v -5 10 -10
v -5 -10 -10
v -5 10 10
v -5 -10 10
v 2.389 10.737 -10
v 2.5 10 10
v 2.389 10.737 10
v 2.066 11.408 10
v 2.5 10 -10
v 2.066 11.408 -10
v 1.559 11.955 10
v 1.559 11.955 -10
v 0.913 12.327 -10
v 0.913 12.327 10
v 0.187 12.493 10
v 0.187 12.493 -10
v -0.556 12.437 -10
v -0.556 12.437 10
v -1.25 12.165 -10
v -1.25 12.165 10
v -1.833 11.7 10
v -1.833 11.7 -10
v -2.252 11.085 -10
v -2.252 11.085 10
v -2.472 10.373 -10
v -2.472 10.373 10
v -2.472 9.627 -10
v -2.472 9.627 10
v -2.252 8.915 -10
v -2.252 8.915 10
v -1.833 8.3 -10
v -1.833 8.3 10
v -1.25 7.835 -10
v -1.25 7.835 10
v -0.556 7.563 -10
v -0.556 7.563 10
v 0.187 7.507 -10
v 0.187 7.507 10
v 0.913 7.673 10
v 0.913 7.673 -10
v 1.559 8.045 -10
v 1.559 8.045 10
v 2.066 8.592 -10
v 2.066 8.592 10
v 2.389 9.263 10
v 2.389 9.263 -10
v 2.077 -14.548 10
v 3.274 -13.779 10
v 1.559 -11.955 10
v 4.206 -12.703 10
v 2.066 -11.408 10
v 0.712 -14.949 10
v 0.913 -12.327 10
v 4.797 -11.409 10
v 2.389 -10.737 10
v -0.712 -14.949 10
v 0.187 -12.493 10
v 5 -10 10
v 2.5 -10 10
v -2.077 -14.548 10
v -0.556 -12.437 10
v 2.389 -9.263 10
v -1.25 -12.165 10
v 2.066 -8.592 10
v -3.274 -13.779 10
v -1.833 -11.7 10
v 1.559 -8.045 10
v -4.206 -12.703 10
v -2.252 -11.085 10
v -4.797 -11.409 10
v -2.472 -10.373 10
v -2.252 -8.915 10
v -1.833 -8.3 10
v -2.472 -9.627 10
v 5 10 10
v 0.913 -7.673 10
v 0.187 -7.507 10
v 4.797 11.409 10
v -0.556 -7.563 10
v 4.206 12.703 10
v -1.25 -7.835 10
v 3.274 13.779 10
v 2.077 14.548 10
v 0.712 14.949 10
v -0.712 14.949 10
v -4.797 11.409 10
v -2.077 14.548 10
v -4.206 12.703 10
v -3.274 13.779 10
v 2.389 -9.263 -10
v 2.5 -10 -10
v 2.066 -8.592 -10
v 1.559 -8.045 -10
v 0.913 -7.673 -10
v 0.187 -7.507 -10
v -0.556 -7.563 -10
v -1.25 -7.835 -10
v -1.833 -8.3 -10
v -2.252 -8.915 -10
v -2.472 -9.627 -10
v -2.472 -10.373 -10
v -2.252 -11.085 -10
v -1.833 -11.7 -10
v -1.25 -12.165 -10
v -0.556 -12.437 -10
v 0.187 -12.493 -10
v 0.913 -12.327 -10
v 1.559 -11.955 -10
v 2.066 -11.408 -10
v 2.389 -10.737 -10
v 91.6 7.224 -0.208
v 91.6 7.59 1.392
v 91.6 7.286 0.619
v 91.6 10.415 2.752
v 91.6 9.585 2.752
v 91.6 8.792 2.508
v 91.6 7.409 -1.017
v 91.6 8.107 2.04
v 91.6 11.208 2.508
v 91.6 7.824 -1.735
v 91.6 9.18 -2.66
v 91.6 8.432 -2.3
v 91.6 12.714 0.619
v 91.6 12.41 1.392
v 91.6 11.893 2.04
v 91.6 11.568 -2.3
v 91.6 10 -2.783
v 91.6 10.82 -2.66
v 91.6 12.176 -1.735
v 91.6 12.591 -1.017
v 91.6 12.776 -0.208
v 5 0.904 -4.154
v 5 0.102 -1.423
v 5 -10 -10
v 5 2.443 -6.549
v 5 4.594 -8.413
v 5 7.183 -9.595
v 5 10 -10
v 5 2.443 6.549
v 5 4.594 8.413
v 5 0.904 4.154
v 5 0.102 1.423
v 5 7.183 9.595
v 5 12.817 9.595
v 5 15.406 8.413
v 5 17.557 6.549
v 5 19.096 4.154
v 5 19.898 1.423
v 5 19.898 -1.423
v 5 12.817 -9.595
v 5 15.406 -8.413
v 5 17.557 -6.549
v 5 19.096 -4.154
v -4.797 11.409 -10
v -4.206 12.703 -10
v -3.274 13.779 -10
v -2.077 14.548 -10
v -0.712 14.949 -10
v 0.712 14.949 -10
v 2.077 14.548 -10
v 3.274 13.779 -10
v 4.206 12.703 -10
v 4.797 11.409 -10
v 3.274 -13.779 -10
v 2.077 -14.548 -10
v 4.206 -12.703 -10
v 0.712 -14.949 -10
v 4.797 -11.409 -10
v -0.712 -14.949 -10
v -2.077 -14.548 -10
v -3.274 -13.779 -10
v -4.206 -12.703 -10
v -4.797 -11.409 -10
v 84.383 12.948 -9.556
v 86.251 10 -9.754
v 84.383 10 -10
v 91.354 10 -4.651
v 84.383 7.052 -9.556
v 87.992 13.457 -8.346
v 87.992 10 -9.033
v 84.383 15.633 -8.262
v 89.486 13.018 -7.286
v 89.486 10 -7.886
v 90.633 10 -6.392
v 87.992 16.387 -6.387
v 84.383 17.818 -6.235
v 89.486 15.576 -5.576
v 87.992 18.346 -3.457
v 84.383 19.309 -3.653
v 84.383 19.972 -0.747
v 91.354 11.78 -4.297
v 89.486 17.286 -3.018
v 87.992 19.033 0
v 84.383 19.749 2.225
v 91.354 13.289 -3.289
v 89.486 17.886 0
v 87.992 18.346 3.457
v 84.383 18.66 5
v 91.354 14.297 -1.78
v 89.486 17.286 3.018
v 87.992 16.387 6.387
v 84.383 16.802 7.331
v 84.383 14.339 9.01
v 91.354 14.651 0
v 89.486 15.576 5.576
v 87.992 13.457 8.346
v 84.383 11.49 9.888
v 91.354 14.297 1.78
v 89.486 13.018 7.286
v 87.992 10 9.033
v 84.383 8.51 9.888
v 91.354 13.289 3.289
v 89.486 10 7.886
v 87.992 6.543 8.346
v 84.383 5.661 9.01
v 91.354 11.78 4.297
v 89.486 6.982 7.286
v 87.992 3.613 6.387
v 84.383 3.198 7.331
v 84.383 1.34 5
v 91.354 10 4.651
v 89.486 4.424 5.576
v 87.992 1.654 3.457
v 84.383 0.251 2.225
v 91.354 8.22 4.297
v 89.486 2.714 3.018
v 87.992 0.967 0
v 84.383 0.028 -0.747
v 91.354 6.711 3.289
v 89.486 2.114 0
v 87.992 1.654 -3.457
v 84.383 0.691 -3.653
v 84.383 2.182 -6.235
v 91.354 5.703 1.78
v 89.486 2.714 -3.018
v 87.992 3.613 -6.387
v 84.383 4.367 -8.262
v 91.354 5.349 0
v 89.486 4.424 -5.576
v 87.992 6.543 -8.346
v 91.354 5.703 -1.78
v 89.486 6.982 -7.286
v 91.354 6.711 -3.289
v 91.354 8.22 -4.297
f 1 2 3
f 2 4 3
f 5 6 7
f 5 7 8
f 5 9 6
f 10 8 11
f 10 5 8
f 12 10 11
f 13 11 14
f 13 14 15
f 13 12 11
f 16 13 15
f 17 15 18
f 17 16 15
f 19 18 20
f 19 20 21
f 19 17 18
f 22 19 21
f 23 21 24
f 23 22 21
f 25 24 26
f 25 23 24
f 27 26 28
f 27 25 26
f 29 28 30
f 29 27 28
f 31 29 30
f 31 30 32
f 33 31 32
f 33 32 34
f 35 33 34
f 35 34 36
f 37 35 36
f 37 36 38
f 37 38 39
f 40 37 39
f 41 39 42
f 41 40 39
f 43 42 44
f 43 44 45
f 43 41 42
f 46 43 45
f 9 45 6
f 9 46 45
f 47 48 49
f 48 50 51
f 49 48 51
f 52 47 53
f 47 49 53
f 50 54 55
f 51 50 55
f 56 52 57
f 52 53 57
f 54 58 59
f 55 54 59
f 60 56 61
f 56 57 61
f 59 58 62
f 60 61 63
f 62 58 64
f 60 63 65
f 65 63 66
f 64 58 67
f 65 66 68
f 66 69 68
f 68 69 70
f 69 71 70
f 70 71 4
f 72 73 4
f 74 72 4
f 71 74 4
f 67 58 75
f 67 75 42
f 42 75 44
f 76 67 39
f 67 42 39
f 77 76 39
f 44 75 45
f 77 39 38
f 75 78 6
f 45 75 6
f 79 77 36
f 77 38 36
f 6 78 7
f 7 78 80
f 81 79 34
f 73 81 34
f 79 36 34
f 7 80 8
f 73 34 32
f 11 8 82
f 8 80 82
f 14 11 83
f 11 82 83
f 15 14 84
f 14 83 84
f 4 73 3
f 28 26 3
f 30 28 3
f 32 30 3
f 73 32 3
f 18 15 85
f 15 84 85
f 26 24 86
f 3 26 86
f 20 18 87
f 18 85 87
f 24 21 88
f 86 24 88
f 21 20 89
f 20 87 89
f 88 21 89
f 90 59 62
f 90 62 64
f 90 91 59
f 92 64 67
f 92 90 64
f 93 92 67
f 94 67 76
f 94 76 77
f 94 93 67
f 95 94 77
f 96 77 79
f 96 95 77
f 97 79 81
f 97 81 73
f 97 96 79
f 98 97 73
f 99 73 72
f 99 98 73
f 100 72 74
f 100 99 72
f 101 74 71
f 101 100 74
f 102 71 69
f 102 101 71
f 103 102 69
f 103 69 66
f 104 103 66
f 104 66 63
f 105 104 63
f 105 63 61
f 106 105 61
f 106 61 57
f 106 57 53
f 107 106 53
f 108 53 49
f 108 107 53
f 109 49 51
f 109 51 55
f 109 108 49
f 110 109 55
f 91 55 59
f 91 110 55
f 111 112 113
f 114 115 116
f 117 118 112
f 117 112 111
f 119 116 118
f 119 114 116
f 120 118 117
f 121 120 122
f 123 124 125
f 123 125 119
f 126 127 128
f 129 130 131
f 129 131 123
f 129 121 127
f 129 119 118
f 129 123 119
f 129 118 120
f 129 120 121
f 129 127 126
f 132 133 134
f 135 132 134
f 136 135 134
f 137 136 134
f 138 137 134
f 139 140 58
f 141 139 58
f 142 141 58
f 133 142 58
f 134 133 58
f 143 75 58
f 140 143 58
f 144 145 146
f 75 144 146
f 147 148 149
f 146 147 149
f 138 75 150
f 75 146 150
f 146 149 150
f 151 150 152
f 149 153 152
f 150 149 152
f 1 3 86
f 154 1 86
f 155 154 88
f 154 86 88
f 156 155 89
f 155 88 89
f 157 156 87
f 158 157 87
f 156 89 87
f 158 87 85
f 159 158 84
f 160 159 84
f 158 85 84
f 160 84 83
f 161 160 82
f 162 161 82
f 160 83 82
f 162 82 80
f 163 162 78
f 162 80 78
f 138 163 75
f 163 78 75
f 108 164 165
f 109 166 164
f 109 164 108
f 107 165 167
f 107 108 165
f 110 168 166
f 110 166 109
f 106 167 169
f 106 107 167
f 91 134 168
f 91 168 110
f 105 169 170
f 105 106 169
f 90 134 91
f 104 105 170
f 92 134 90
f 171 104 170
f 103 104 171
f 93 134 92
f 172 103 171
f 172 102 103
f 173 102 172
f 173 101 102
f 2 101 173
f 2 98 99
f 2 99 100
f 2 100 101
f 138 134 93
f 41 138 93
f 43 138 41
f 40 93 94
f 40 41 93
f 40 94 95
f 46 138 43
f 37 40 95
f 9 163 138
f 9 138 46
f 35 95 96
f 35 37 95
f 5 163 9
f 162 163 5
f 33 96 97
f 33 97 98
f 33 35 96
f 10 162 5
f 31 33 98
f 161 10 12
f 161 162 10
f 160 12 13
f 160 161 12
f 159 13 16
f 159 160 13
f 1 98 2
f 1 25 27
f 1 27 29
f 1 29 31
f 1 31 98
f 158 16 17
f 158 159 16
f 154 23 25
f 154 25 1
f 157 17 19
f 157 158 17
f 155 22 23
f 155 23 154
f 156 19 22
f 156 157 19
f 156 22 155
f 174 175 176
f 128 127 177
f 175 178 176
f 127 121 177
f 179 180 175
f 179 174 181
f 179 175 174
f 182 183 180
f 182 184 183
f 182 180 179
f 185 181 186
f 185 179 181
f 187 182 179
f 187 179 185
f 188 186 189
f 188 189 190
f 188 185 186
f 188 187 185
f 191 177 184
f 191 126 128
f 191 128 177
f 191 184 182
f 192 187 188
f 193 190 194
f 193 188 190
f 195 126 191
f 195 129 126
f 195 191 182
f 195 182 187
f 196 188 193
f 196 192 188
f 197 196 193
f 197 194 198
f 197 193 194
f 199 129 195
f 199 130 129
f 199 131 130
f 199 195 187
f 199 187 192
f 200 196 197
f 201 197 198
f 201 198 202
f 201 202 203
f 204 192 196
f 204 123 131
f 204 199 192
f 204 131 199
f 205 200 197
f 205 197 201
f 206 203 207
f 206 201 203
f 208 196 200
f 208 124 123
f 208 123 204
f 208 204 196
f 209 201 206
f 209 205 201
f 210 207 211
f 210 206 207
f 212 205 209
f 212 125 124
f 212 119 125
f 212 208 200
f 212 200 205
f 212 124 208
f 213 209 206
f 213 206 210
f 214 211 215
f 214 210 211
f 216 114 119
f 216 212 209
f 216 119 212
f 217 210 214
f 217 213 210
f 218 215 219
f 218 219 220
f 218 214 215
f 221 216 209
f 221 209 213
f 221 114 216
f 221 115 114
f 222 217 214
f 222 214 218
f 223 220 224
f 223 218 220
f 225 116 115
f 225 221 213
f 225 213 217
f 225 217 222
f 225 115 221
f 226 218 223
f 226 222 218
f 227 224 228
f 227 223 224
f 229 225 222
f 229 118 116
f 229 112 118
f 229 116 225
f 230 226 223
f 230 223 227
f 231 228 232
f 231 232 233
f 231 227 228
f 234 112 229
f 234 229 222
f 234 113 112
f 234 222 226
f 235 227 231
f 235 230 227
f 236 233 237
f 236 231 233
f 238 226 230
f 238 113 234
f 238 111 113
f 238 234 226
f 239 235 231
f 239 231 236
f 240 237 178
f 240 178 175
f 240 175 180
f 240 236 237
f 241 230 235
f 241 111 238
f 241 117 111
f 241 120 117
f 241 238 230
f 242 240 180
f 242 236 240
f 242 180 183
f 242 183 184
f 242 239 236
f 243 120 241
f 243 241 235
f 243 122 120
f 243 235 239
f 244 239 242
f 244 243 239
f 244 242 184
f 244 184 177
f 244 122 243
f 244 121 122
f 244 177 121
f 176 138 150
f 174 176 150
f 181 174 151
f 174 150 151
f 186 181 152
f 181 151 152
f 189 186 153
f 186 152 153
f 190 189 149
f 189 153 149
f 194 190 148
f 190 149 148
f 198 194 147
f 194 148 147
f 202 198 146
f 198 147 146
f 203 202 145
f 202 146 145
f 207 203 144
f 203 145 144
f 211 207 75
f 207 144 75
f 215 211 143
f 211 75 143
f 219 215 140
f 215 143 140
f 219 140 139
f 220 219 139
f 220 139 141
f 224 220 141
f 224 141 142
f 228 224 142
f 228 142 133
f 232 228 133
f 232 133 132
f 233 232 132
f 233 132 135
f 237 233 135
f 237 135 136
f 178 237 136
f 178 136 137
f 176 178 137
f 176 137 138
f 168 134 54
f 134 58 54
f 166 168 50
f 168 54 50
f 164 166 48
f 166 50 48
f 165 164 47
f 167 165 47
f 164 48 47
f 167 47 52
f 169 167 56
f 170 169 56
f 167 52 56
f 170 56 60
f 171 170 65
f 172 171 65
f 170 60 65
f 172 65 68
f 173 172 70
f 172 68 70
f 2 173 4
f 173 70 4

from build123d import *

# Parameters (mm, degrees)
ESQUISSE1_R        = 2.5
BOSS_EXTRU_1_DEPTH = 10
ESQUISSE2_R        = 10
BOSS_EXTRU_2_DEPTH = 86.6
CONG_1_R           = 7.216666667


with BuildPart() as part:
    # Esquisse1 → Boss.-Extru.1 (new, symmetric)
    with BuildSketch(Plane.XY):
        with BuildLine():
            Line((5, 10), (5, -10))
            ThreePointArc((5, -10), (0, -15), (-5, -10))
            Line((-5, -10), (-5, 10))
            ThreePointArc((-5, 10), (0, 15), (5, 10))
        make_face()
        with Locations((0, 10)):
            Circle(ESQUISSE1_R, mode=Mode.SUBTRACT)
        with Locations((0, -10)):
            Circle(ESQUISSE1_R, mode=Mode.SUBTRACT)
    extrude(amount=BOSS_EXTRU_1_DEPTH, both=True)

    # Esquisse2 → Boss.-Extru.2 (add)
    with BuildSketch(Plane(origin=(5, 0, 0), x_dir=(0, 0, -1), z_dir=(1, 0, 0))):
        with Locations((0, 10)):
            Circle(ESQUISSE2_R)
    extrude(amount=BOSS_EXTRU_2_DEPTH)

    # Congé1
    cong_1_edges = [part.edges().sort_by_distance(p)[0] for p in [
        (91.6, 10, 10),
    ]]
    fillet(cong_1_edges, radius=CONG_1_R)


solid = part.part
